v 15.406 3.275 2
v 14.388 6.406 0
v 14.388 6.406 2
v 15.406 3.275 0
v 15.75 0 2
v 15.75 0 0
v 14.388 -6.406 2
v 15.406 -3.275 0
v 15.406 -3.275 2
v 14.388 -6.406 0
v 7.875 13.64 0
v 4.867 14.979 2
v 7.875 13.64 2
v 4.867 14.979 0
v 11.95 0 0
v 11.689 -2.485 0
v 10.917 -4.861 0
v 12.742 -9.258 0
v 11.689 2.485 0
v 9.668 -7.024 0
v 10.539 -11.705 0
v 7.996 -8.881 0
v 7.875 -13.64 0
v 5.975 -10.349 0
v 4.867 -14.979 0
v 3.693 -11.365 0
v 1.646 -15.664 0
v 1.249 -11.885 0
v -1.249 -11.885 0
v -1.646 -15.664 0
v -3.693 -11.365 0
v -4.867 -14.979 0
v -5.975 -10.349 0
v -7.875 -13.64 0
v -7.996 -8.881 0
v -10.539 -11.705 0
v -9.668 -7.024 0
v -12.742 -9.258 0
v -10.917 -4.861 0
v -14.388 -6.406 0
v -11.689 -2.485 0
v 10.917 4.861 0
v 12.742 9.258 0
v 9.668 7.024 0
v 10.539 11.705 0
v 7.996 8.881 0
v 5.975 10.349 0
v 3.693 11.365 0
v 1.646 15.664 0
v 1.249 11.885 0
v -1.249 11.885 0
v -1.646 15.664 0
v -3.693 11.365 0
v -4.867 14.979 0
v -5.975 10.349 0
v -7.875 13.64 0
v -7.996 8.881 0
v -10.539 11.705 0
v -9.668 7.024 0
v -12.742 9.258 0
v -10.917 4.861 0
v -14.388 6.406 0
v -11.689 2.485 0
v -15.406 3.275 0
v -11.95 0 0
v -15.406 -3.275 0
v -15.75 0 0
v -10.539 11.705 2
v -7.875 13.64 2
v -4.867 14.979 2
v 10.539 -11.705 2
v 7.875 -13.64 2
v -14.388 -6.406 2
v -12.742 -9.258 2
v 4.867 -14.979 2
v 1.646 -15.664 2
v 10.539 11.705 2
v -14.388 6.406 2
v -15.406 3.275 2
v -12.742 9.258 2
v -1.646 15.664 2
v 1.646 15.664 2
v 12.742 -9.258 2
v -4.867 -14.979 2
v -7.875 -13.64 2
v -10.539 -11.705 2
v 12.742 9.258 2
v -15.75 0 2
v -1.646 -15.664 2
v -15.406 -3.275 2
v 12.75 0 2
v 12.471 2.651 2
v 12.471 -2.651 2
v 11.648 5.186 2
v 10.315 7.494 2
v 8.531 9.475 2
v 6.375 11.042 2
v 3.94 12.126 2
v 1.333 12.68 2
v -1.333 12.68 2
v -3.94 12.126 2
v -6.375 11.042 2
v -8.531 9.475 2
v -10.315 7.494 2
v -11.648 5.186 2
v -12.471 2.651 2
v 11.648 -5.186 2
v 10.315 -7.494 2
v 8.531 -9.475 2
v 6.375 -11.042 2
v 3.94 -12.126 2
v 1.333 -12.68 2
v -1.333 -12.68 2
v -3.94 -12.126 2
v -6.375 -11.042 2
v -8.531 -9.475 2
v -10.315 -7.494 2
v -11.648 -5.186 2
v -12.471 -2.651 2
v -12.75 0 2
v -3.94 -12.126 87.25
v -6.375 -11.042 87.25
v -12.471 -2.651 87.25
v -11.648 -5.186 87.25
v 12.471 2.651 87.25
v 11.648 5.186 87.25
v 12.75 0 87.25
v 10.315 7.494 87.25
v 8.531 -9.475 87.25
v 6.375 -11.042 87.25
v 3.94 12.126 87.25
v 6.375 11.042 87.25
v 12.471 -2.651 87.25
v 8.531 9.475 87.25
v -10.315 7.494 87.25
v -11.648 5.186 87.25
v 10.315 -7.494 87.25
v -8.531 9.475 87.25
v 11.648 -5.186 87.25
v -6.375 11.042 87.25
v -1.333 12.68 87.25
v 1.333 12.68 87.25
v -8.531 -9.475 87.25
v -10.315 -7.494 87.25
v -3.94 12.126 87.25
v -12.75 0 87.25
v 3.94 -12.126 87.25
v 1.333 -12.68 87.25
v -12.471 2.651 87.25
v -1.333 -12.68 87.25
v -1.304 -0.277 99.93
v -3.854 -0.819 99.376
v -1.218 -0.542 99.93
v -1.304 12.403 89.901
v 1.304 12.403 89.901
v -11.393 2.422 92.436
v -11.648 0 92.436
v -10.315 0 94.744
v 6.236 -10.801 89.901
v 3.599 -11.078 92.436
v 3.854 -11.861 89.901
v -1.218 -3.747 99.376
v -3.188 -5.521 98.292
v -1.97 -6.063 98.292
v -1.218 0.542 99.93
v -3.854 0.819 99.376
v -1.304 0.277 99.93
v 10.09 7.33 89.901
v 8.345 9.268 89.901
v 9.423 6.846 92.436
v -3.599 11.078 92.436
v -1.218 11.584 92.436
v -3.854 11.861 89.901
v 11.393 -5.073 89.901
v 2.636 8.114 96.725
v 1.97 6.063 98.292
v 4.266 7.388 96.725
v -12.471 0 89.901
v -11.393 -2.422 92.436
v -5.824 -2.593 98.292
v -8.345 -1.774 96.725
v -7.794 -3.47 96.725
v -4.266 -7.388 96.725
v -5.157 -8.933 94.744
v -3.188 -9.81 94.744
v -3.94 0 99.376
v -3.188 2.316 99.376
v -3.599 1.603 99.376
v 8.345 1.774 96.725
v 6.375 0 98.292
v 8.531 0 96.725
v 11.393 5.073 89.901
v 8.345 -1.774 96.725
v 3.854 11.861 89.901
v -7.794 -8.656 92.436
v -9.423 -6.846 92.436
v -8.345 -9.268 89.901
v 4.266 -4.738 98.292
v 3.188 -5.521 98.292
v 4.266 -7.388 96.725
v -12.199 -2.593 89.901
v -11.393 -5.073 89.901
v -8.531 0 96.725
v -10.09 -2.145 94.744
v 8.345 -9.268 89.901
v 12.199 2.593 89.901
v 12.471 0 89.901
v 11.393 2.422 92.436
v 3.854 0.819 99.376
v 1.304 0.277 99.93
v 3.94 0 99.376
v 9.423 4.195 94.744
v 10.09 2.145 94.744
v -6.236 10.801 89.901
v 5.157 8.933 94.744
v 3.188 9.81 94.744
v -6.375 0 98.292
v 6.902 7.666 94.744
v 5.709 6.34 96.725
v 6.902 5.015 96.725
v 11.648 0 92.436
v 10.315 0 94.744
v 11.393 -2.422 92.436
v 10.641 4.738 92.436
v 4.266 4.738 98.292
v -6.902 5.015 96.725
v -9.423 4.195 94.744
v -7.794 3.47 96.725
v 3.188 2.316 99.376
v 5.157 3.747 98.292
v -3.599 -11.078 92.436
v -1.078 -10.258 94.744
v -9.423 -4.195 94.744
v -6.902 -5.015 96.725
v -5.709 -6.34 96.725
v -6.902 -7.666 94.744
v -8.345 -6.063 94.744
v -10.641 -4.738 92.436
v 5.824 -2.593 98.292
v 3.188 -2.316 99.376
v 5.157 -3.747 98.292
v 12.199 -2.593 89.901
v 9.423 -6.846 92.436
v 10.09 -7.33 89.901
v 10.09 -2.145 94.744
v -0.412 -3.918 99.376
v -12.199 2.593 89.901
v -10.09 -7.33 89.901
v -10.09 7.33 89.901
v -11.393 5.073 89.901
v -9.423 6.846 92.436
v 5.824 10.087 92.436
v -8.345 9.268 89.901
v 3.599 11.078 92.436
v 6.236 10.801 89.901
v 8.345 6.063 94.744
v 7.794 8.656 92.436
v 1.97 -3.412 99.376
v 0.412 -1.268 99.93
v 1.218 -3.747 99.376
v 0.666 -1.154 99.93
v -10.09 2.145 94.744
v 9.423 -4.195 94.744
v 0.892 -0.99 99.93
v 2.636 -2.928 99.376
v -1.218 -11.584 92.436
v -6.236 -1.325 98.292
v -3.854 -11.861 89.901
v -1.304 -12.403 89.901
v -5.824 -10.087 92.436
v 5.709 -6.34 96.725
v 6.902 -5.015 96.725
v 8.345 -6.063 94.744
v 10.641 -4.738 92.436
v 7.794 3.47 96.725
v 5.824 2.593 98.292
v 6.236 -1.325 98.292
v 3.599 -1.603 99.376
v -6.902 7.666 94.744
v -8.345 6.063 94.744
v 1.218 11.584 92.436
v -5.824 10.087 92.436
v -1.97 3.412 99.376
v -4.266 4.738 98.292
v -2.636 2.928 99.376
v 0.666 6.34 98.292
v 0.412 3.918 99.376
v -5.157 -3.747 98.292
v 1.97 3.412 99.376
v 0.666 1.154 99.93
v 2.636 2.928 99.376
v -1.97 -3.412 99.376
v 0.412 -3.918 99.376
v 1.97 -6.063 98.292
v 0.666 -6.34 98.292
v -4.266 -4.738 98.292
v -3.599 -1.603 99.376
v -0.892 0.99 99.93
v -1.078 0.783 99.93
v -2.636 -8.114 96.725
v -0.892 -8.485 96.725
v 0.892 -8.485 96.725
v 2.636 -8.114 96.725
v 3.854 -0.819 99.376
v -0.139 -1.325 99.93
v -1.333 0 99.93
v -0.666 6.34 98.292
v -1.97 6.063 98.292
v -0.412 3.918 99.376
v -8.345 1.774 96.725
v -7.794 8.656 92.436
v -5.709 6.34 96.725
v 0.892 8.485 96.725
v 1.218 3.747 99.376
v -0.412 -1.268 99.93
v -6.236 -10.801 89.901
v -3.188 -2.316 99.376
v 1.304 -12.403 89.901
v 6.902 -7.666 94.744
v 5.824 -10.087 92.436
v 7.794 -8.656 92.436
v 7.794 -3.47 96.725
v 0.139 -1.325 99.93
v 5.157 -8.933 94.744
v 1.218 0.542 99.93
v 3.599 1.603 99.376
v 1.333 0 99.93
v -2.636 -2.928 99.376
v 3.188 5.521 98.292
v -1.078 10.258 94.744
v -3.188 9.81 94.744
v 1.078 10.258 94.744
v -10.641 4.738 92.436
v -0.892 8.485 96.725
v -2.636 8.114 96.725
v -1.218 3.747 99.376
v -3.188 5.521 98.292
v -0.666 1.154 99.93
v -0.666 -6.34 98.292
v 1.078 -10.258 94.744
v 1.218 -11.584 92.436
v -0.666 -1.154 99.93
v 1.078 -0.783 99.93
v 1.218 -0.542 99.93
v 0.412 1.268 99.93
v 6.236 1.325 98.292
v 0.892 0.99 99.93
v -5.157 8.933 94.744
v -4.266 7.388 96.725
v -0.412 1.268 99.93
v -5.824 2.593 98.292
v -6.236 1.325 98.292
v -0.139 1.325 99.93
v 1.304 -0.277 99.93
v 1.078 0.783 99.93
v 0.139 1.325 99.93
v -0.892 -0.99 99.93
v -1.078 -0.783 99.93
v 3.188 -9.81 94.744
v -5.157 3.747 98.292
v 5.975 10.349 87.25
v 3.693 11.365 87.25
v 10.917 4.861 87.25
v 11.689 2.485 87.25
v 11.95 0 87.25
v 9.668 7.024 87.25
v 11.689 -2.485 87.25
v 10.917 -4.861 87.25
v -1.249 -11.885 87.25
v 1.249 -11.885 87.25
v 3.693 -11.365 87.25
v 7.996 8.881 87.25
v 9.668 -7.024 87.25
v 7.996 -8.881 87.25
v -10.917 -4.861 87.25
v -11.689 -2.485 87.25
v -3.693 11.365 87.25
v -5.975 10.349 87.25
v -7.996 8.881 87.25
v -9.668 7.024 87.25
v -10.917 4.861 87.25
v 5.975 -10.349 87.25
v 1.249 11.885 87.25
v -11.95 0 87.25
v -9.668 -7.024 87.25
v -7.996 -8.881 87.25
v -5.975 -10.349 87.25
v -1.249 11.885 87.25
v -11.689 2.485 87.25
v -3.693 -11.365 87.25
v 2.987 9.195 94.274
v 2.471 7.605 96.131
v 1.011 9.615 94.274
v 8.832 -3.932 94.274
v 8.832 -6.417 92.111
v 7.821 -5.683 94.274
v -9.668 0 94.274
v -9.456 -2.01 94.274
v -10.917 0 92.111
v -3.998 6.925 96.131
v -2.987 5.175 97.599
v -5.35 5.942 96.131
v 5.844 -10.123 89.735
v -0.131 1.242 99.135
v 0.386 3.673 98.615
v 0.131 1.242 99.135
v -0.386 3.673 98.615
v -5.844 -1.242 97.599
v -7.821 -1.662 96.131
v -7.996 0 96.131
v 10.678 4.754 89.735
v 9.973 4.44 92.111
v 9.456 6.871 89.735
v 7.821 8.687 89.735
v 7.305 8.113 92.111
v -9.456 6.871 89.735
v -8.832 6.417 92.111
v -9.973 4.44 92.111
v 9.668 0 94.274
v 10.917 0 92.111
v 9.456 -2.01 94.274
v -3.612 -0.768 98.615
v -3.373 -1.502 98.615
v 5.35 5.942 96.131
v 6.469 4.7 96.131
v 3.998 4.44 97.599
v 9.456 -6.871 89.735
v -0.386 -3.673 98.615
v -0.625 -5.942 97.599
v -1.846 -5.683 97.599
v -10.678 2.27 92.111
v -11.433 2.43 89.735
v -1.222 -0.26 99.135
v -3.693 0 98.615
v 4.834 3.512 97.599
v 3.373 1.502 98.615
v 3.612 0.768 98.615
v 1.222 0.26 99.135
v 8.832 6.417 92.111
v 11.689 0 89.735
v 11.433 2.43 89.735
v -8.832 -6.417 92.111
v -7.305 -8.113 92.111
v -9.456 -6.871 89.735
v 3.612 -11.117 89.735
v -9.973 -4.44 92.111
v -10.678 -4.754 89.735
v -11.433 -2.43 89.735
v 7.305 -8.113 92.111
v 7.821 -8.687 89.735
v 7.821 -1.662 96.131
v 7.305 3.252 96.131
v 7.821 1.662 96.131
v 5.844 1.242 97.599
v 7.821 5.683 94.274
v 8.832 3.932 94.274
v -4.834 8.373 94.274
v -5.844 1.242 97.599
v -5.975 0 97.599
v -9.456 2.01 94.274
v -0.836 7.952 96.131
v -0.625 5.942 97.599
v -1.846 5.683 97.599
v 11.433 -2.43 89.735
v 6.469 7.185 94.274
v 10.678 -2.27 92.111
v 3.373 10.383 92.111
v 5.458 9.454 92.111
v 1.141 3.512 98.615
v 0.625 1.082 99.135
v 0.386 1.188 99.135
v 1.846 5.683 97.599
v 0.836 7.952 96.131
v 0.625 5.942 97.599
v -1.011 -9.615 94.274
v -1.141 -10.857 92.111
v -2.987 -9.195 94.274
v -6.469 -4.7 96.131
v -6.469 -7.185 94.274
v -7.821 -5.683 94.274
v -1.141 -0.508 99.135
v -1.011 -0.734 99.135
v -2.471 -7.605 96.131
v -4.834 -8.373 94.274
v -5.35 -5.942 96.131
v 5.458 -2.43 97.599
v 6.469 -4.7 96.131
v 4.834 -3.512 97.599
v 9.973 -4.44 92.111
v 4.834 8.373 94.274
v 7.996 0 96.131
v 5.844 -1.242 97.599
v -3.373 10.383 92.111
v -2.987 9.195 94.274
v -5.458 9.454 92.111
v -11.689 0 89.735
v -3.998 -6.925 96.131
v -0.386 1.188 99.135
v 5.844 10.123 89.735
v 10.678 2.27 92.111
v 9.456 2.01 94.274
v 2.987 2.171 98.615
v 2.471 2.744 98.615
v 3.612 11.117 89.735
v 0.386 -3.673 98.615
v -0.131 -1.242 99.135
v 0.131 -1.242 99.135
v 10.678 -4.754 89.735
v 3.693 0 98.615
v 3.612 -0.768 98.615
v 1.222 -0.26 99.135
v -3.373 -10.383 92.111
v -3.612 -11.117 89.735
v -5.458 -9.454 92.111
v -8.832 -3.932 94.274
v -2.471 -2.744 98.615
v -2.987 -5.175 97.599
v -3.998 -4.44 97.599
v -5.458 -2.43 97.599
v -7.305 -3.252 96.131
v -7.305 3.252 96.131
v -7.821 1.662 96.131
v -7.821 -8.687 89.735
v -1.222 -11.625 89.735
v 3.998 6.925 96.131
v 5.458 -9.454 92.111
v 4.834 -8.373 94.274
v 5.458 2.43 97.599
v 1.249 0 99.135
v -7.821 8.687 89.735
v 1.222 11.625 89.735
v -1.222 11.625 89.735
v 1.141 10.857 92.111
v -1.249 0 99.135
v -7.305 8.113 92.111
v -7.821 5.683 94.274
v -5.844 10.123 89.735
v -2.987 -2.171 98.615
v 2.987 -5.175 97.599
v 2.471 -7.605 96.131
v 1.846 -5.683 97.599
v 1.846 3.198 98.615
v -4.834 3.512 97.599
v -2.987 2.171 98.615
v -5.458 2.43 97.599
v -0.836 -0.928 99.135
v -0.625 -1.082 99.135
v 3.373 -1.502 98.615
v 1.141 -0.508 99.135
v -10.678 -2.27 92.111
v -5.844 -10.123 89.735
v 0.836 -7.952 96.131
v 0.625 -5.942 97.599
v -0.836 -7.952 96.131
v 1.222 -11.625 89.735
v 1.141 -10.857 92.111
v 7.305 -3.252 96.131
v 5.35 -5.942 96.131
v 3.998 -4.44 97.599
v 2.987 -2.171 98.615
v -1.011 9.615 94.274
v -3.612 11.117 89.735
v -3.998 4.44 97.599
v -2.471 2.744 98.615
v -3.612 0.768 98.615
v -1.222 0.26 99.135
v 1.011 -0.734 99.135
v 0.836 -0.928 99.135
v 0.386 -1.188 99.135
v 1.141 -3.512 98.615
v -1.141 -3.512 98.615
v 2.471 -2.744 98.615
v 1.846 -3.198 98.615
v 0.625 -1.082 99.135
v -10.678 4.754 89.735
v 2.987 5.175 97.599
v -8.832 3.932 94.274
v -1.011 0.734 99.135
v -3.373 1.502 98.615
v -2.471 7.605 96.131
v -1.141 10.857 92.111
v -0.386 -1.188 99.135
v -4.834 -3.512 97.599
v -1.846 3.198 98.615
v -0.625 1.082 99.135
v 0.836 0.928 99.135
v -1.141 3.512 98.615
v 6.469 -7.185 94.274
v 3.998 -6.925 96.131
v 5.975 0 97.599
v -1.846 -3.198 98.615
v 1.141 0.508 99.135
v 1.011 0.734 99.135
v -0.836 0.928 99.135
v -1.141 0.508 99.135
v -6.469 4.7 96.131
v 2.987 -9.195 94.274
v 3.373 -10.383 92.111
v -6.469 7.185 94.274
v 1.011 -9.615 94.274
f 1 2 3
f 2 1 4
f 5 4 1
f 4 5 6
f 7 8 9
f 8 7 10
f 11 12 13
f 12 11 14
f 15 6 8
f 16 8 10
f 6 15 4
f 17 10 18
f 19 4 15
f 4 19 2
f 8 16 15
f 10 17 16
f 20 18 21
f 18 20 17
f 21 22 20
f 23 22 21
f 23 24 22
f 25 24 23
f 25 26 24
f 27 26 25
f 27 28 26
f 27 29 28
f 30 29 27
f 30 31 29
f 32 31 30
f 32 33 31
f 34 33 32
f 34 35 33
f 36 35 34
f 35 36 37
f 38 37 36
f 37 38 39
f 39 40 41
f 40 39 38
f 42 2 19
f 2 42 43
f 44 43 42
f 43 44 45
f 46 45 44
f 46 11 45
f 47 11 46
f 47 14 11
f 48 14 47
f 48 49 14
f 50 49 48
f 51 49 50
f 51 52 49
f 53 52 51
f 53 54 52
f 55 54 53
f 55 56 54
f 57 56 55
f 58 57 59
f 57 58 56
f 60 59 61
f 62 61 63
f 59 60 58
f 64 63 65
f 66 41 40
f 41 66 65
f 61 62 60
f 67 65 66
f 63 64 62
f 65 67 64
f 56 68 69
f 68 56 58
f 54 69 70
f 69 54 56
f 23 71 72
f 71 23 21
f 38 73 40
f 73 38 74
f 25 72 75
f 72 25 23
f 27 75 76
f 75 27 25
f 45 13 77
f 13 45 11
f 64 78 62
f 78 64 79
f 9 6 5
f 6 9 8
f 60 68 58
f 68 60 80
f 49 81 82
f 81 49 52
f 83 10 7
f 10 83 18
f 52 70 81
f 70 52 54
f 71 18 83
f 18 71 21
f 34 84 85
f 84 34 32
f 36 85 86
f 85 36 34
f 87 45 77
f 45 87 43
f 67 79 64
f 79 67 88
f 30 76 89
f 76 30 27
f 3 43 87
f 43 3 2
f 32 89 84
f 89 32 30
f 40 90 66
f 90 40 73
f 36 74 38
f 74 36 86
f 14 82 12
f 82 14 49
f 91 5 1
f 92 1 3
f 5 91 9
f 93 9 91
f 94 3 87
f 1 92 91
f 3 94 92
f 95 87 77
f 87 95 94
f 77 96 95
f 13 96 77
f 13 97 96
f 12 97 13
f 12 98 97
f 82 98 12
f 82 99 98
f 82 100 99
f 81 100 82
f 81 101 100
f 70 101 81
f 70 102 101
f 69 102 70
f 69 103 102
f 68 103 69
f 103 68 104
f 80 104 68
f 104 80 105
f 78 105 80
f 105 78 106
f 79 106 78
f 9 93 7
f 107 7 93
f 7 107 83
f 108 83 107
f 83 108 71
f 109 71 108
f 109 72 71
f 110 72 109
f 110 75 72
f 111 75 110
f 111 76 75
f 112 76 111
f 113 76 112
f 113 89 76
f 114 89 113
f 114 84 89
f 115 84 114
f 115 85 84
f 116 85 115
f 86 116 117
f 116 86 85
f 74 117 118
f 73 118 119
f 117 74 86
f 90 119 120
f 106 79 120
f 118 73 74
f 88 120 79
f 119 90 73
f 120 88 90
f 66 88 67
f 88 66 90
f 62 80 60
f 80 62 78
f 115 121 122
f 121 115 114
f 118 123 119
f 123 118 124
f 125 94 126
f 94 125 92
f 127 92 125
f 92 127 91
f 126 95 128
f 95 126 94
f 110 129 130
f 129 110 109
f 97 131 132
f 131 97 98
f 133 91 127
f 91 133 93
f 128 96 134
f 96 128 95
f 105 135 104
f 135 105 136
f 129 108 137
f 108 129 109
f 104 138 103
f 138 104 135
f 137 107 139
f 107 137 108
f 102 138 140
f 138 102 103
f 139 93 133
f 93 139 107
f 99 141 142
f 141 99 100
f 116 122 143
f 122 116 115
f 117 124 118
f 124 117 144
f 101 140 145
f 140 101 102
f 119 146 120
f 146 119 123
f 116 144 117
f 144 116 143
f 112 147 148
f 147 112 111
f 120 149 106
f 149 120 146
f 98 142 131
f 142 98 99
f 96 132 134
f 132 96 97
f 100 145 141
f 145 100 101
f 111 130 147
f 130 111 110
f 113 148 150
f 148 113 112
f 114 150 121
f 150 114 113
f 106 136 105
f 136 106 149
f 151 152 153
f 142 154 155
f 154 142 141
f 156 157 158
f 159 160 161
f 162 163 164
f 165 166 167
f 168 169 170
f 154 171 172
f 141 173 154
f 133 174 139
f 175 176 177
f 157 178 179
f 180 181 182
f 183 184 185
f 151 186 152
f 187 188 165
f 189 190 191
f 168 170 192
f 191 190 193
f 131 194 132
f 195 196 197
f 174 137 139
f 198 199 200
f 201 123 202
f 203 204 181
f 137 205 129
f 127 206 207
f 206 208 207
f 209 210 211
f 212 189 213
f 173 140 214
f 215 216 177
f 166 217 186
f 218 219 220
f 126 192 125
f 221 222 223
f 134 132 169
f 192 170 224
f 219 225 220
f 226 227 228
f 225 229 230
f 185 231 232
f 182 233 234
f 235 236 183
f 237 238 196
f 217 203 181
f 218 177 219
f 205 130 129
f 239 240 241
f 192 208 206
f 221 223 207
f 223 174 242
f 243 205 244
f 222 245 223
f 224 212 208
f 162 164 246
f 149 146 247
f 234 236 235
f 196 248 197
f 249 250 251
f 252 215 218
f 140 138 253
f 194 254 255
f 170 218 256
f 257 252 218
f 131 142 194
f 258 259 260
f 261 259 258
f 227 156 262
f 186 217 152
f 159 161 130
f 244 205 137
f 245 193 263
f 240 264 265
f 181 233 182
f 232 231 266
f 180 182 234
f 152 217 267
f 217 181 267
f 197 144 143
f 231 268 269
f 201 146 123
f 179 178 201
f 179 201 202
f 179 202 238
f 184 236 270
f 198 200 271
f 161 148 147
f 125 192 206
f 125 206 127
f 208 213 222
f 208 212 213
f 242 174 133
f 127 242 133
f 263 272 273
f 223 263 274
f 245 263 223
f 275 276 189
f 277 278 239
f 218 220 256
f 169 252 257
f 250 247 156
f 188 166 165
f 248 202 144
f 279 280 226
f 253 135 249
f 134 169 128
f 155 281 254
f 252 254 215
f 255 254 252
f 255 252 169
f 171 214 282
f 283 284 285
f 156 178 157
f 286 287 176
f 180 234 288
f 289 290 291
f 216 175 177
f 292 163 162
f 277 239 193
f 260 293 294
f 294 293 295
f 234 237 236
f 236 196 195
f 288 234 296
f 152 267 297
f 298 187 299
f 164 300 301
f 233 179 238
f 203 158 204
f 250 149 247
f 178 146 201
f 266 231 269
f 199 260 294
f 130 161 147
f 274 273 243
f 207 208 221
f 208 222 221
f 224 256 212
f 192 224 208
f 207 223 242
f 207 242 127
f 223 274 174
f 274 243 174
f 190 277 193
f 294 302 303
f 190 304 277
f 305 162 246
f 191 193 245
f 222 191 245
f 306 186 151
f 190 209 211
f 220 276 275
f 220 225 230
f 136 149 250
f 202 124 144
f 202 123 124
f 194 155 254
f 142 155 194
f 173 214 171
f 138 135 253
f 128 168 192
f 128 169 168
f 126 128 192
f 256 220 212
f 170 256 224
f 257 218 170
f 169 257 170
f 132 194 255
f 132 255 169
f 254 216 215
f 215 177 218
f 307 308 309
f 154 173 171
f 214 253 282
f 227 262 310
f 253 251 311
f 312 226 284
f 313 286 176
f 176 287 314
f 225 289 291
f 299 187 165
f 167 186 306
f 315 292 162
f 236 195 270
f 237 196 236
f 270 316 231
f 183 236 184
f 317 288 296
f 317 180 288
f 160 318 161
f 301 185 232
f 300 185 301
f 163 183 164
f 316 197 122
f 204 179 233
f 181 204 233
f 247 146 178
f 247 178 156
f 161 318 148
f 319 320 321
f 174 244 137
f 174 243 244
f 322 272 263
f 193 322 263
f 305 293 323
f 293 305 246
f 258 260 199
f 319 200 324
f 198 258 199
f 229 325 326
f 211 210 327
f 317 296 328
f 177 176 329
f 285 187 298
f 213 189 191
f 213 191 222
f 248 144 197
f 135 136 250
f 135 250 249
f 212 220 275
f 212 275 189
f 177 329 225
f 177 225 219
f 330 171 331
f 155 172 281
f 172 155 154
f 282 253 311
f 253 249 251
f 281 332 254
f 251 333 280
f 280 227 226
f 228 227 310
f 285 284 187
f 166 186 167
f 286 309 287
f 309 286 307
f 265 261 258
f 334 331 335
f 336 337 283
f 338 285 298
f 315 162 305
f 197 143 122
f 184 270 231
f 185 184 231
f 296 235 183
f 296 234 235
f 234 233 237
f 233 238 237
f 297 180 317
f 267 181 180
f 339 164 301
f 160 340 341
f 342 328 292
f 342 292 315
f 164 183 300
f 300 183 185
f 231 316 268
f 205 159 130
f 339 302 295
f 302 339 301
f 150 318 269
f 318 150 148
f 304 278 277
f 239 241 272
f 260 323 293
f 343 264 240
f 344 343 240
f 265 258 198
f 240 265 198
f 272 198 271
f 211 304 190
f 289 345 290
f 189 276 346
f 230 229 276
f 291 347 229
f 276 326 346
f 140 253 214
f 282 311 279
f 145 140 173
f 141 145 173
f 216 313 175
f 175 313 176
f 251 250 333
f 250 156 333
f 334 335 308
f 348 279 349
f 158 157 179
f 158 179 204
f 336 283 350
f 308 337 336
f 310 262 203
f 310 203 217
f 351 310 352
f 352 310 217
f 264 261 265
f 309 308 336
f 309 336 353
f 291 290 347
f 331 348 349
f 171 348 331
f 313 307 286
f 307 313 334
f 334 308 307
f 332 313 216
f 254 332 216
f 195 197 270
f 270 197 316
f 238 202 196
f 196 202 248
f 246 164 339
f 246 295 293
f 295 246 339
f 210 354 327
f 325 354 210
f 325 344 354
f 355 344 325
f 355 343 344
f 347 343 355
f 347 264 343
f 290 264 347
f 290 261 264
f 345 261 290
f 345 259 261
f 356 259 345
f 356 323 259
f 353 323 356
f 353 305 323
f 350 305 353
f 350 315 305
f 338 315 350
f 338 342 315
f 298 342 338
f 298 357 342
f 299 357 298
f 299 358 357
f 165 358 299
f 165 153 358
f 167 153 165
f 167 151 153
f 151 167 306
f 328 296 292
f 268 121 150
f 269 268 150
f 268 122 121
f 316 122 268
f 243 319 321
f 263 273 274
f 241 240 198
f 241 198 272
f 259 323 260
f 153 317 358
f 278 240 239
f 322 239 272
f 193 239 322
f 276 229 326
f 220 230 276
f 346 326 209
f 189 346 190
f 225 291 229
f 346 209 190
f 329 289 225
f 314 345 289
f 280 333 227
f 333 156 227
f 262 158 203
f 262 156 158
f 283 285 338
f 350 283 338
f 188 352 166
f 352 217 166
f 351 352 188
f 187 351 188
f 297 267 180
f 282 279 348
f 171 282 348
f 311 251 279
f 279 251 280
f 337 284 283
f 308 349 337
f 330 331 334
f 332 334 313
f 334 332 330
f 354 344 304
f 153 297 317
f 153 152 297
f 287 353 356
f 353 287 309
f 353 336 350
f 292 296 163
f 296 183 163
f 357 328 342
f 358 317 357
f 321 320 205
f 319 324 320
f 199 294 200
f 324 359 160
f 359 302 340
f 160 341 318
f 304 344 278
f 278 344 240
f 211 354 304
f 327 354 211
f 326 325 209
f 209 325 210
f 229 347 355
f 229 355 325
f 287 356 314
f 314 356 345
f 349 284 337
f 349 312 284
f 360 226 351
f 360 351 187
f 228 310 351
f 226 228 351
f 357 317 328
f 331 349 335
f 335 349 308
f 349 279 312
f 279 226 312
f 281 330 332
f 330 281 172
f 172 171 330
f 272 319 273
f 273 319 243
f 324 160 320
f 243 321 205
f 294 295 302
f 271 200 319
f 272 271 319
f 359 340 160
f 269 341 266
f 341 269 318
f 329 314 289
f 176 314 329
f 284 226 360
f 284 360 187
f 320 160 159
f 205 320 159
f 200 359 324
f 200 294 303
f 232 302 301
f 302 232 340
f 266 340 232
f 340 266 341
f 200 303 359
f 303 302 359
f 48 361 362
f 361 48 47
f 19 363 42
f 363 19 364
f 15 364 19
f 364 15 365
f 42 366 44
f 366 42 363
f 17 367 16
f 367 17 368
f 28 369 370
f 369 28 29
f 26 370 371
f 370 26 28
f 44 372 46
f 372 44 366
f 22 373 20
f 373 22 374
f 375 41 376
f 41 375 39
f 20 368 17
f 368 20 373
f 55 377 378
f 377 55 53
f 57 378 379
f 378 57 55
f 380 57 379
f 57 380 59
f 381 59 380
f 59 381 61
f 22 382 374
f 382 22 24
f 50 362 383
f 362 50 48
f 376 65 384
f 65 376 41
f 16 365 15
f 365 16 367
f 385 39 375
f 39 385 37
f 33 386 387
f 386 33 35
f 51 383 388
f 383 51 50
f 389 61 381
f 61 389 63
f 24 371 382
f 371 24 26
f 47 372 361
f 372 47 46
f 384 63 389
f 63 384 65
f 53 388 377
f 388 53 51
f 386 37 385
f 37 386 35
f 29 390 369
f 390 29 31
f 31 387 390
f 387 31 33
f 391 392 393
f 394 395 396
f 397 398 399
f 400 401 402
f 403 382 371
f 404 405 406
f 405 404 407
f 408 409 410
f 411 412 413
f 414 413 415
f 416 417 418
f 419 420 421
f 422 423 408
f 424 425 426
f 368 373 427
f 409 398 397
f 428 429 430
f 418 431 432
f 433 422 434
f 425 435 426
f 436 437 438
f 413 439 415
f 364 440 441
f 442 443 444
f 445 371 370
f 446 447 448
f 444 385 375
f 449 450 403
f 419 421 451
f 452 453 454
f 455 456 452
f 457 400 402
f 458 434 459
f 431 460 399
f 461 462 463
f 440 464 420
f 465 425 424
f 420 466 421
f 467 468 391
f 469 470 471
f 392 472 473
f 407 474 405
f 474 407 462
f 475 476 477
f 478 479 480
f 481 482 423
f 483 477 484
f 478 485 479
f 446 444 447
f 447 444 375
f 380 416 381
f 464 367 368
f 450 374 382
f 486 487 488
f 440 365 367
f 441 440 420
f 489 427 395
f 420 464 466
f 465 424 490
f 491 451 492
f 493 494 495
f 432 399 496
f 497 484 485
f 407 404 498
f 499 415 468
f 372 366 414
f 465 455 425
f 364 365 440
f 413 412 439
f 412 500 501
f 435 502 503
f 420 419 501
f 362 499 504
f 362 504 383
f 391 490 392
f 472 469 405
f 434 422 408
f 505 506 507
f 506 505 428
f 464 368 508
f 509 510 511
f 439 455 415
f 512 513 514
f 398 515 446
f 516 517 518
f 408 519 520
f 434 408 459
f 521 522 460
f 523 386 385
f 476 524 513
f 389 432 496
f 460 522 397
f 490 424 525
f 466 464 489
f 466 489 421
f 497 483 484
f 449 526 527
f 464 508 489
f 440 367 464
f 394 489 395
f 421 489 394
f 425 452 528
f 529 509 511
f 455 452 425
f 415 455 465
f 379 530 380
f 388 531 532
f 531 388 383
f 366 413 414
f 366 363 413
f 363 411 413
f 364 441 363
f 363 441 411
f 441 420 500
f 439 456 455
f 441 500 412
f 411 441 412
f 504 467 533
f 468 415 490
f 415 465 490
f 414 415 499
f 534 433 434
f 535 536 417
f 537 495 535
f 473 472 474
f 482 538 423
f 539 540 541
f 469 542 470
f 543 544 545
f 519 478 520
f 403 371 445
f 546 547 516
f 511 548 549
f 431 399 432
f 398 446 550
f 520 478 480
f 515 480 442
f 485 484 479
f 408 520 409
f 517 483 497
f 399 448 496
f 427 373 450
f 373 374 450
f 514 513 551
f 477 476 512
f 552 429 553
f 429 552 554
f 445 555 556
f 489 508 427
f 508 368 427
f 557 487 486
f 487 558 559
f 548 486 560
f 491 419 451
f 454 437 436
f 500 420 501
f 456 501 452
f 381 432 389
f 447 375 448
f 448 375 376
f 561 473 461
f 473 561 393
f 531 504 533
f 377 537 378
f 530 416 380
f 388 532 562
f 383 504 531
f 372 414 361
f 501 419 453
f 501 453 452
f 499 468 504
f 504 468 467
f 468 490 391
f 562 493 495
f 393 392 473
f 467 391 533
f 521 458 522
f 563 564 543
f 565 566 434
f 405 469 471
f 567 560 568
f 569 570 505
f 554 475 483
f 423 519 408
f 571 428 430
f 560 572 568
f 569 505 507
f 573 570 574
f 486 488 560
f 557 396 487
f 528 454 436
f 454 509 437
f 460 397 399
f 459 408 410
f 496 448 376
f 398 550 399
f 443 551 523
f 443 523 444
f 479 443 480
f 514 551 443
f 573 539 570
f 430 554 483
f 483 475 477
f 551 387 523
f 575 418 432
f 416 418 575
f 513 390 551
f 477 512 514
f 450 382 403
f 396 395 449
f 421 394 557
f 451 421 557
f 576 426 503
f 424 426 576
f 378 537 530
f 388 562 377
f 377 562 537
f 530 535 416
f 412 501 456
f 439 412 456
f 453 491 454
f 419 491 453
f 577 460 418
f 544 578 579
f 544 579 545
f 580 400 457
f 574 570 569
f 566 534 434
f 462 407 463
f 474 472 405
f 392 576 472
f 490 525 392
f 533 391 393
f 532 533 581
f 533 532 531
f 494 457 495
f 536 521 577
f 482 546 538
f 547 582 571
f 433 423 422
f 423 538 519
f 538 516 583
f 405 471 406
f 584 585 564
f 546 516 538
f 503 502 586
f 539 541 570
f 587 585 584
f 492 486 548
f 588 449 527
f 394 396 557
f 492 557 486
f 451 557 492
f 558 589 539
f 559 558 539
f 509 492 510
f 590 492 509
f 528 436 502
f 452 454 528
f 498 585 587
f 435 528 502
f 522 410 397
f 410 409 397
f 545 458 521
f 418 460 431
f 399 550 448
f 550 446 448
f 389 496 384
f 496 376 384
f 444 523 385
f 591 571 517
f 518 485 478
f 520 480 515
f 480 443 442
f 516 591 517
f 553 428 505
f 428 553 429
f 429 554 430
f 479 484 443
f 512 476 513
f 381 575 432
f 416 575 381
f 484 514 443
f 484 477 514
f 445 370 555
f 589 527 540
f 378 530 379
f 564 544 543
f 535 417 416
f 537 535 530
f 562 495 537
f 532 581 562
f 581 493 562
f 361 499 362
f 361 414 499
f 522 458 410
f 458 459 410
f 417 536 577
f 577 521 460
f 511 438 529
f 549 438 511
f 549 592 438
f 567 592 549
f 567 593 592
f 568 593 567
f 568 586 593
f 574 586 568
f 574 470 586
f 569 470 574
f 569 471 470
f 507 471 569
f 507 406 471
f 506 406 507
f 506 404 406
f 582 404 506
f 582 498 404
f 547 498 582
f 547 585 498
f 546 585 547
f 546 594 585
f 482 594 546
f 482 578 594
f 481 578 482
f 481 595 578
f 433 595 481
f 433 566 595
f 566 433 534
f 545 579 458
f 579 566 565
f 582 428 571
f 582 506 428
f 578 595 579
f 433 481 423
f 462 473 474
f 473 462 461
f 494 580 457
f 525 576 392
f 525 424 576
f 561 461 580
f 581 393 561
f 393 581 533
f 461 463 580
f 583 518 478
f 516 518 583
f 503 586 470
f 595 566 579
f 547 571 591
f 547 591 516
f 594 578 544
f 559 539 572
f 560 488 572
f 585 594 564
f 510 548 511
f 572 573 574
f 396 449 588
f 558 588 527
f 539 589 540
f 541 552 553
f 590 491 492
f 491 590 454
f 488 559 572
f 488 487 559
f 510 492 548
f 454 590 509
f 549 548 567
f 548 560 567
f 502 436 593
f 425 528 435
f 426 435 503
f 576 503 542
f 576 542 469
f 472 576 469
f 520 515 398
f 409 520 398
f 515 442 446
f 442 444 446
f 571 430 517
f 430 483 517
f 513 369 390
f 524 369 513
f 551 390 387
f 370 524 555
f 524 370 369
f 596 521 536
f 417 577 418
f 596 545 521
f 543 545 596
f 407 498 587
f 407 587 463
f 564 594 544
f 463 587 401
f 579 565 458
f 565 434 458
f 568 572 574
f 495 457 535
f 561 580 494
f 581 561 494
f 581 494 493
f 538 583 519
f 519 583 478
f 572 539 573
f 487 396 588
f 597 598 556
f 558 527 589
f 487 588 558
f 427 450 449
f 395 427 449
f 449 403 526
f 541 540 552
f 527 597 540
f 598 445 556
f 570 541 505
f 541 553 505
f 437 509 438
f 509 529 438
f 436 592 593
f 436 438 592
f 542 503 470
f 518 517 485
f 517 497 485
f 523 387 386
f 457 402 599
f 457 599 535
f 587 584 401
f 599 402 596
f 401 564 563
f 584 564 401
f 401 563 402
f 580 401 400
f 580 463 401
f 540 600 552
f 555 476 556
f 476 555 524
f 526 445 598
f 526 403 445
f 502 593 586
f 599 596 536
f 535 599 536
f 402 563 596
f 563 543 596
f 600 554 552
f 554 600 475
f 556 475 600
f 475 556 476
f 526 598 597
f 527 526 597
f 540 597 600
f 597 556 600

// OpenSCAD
dia=25.5; //diametro esterno tubo
h=100; //altezza totale

difference(){
    union(){
cylinder(2,d1=dia+6,d2=dia+6);
cylinder(h-dia/2,d1=dia,d2=dia);
translate([0,0,h-dia/2])sphere(dia/2);
    }
cylinder(h-dia/2,d1=dia-1.6,d2=dia-1.6);
translate([0,0,h-dia/2])sphere((dia-1.6)/2);
}
